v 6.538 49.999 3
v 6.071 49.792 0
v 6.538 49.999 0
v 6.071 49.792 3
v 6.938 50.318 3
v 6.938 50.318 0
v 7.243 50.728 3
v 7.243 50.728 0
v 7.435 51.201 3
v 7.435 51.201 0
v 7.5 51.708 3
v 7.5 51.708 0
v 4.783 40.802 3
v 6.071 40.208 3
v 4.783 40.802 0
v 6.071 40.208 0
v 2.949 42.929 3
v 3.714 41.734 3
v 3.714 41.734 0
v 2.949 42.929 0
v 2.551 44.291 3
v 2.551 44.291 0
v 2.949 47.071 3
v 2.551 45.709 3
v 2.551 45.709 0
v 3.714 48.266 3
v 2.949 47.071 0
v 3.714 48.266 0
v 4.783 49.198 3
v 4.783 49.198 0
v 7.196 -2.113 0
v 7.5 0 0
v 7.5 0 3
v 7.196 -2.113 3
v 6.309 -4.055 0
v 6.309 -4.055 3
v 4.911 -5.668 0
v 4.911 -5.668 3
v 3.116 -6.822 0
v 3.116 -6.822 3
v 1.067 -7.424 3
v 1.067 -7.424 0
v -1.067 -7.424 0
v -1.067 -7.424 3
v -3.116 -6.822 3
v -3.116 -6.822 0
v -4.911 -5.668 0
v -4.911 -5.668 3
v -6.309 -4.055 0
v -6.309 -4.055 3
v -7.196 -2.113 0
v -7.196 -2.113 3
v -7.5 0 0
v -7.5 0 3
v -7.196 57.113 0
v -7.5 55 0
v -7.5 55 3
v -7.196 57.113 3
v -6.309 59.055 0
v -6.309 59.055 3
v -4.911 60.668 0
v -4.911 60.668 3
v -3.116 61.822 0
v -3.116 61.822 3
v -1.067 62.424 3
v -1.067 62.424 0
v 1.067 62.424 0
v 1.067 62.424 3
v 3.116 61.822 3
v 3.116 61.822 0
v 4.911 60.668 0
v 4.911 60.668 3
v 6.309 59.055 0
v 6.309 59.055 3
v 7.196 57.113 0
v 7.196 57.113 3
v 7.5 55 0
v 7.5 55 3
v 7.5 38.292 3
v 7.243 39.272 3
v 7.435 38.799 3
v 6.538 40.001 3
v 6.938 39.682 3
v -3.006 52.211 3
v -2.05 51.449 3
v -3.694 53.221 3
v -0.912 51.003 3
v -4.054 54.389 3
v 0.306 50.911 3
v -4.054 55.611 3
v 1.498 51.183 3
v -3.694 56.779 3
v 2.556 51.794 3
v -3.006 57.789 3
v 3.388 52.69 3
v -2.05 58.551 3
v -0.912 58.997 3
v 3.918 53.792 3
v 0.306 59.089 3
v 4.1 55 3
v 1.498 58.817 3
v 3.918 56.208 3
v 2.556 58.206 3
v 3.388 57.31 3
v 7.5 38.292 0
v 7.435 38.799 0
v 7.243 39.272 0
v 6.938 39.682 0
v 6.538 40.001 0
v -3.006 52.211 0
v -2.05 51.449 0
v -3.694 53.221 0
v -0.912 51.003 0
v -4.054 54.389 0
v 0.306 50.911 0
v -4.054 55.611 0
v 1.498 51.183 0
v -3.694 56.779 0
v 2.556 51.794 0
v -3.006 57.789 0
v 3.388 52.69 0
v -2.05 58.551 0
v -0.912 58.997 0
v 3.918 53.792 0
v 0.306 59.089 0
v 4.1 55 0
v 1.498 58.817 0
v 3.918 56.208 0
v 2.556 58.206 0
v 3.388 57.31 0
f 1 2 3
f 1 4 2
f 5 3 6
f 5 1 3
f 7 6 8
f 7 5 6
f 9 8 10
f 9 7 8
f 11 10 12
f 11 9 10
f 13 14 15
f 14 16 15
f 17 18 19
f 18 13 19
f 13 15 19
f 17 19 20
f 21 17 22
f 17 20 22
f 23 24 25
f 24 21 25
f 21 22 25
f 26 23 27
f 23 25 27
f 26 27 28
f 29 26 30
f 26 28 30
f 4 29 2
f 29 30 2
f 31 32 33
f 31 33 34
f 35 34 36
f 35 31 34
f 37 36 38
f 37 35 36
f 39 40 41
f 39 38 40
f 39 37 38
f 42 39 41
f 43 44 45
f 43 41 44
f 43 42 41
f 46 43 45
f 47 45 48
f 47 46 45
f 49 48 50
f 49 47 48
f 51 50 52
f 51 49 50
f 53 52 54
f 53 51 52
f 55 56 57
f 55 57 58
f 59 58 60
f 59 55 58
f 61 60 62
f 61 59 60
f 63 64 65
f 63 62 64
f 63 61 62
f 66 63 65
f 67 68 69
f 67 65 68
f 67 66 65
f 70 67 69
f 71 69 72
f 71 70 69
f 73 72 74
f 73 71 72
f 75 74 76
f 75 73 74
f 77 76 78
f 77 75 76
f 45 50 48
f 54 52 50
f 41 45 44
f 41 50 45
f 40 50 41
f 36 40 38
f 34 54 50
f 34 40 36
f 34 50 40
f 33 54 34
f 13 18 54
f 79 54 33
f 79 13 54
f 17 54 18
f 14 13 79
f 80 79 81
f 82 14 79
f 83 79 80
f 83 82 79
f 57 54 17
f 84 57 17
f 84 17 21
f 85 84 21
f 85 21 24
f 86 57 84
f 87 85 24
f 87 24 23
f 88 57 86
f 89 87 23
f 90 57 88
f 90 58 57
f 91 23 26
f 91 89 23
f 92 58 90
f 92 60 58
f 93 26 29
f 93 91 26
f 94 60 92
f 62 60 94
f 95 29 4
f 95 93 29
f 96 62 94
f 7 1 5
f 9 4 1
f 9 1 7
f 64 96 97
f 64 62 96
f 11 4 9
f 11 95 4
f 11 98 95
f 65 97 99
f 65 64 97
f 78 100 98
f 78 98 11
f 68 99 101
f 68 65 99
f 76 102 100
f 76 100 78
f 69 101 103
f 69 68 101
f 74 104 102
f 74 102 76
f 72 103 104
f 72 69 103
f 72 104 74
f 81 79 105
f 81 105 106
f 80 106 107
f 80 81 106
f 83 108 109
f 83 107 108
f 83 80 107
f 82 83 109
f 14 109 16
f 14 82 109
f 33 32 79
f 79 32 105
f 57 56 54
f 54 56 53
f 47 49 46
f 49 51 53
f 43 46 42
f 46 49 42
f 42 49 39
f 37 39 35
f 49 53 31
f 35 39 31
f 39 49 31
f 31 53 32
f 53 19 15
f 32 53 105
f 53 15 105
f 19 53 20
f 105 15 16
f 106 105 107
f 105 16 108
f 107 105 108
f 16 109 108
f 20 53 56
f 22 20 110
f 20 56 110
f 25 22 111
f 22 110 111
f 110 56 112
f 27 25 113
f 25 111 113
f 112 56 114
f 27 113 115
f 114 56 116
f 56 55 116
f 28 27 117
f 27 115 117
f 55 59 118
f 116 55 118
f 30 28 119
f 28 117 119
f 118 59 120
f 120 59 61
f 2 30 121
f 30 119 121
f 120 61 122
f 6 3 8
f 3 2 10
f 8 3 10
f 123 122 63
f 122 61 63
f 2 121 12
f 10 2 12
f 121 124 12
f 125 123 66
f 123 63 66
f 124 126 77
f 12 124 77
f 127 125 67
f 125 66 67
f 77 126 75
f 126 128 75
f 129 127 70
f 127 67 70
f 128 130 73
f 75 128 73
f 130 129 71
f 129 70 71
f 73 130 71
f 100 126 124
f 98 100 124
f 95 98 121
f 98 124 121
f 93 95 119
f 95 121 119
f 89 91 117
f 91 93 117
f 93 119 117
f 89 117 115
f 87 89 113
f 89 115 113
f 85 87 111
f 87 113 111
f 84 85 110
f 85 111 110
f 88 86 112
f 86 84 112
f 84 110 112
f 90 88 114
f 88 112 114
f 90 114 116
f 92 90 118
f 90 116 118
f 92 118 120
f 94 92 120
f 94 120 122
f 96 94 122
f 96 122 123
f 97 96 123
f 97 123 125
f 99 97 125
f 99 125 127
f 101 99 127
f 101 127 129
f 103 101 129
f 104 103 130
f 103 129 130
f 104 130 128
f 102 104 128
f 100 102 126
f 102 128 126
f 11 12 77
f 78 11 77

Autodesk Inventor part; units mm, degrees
ref_plane "YZ Plane" through (0, 0, 0) normal (1, 0, 0) x (0, 1, 0)
ref_plane "XZ Plane" through (0, 0, 0) normal (0, 1, 0) x (-1, 0, 0)
ref_plane "XY Plane" through (0, 0, 0) normal (0, 0, 1) x (1, 0, 0)
sketch "Sketch1" plane through (0, 0, 0) normal (0, 0, 1) x (1, 0, 0)
  circle A0 centre (0, 0) radius 4.1
  arc A1 (-7.5, 0) -> (7.5, 0) centre (0, 0) ccw
  circle A2 centre (0, 55) radius 4.1
  arc A3 (7.5, 55) -> (-7.5, 55) centre (0, 55) ccw
  line L0 (-7.5, 55) -> (-7.5, 0)
  circle A4 centre (7.5, 45) radius 5
  line L1 (7.5, 0) -> (7.5, 40)
  line L2 (7.5, 50) -> (7.5, 55)
  dimension "d0" = 55
  dimension "d1" = 15
  dimension "d2" = 8.2
  dimension "d3" = 8.2
  dimension "d4" = 10
  dimension "d5" = 10
  dimension "d8" = 15
  dimension "d10" = 15
extrude "Extrusion1" add sketch "Sketch1" along normal blind 3 contours A0 | L0 A3 L2 A4 L1 A1
fillet "Fillet1" radius 2 2 edges at (7.5, 50, 1.5) (7.5, 40, 1.5)
equation "\"d3\" = d2"
equation "\"d5\" = d4"
equation "\"d8\" = d10"
properties part number "Jambe" material "Aluminum 6061"
